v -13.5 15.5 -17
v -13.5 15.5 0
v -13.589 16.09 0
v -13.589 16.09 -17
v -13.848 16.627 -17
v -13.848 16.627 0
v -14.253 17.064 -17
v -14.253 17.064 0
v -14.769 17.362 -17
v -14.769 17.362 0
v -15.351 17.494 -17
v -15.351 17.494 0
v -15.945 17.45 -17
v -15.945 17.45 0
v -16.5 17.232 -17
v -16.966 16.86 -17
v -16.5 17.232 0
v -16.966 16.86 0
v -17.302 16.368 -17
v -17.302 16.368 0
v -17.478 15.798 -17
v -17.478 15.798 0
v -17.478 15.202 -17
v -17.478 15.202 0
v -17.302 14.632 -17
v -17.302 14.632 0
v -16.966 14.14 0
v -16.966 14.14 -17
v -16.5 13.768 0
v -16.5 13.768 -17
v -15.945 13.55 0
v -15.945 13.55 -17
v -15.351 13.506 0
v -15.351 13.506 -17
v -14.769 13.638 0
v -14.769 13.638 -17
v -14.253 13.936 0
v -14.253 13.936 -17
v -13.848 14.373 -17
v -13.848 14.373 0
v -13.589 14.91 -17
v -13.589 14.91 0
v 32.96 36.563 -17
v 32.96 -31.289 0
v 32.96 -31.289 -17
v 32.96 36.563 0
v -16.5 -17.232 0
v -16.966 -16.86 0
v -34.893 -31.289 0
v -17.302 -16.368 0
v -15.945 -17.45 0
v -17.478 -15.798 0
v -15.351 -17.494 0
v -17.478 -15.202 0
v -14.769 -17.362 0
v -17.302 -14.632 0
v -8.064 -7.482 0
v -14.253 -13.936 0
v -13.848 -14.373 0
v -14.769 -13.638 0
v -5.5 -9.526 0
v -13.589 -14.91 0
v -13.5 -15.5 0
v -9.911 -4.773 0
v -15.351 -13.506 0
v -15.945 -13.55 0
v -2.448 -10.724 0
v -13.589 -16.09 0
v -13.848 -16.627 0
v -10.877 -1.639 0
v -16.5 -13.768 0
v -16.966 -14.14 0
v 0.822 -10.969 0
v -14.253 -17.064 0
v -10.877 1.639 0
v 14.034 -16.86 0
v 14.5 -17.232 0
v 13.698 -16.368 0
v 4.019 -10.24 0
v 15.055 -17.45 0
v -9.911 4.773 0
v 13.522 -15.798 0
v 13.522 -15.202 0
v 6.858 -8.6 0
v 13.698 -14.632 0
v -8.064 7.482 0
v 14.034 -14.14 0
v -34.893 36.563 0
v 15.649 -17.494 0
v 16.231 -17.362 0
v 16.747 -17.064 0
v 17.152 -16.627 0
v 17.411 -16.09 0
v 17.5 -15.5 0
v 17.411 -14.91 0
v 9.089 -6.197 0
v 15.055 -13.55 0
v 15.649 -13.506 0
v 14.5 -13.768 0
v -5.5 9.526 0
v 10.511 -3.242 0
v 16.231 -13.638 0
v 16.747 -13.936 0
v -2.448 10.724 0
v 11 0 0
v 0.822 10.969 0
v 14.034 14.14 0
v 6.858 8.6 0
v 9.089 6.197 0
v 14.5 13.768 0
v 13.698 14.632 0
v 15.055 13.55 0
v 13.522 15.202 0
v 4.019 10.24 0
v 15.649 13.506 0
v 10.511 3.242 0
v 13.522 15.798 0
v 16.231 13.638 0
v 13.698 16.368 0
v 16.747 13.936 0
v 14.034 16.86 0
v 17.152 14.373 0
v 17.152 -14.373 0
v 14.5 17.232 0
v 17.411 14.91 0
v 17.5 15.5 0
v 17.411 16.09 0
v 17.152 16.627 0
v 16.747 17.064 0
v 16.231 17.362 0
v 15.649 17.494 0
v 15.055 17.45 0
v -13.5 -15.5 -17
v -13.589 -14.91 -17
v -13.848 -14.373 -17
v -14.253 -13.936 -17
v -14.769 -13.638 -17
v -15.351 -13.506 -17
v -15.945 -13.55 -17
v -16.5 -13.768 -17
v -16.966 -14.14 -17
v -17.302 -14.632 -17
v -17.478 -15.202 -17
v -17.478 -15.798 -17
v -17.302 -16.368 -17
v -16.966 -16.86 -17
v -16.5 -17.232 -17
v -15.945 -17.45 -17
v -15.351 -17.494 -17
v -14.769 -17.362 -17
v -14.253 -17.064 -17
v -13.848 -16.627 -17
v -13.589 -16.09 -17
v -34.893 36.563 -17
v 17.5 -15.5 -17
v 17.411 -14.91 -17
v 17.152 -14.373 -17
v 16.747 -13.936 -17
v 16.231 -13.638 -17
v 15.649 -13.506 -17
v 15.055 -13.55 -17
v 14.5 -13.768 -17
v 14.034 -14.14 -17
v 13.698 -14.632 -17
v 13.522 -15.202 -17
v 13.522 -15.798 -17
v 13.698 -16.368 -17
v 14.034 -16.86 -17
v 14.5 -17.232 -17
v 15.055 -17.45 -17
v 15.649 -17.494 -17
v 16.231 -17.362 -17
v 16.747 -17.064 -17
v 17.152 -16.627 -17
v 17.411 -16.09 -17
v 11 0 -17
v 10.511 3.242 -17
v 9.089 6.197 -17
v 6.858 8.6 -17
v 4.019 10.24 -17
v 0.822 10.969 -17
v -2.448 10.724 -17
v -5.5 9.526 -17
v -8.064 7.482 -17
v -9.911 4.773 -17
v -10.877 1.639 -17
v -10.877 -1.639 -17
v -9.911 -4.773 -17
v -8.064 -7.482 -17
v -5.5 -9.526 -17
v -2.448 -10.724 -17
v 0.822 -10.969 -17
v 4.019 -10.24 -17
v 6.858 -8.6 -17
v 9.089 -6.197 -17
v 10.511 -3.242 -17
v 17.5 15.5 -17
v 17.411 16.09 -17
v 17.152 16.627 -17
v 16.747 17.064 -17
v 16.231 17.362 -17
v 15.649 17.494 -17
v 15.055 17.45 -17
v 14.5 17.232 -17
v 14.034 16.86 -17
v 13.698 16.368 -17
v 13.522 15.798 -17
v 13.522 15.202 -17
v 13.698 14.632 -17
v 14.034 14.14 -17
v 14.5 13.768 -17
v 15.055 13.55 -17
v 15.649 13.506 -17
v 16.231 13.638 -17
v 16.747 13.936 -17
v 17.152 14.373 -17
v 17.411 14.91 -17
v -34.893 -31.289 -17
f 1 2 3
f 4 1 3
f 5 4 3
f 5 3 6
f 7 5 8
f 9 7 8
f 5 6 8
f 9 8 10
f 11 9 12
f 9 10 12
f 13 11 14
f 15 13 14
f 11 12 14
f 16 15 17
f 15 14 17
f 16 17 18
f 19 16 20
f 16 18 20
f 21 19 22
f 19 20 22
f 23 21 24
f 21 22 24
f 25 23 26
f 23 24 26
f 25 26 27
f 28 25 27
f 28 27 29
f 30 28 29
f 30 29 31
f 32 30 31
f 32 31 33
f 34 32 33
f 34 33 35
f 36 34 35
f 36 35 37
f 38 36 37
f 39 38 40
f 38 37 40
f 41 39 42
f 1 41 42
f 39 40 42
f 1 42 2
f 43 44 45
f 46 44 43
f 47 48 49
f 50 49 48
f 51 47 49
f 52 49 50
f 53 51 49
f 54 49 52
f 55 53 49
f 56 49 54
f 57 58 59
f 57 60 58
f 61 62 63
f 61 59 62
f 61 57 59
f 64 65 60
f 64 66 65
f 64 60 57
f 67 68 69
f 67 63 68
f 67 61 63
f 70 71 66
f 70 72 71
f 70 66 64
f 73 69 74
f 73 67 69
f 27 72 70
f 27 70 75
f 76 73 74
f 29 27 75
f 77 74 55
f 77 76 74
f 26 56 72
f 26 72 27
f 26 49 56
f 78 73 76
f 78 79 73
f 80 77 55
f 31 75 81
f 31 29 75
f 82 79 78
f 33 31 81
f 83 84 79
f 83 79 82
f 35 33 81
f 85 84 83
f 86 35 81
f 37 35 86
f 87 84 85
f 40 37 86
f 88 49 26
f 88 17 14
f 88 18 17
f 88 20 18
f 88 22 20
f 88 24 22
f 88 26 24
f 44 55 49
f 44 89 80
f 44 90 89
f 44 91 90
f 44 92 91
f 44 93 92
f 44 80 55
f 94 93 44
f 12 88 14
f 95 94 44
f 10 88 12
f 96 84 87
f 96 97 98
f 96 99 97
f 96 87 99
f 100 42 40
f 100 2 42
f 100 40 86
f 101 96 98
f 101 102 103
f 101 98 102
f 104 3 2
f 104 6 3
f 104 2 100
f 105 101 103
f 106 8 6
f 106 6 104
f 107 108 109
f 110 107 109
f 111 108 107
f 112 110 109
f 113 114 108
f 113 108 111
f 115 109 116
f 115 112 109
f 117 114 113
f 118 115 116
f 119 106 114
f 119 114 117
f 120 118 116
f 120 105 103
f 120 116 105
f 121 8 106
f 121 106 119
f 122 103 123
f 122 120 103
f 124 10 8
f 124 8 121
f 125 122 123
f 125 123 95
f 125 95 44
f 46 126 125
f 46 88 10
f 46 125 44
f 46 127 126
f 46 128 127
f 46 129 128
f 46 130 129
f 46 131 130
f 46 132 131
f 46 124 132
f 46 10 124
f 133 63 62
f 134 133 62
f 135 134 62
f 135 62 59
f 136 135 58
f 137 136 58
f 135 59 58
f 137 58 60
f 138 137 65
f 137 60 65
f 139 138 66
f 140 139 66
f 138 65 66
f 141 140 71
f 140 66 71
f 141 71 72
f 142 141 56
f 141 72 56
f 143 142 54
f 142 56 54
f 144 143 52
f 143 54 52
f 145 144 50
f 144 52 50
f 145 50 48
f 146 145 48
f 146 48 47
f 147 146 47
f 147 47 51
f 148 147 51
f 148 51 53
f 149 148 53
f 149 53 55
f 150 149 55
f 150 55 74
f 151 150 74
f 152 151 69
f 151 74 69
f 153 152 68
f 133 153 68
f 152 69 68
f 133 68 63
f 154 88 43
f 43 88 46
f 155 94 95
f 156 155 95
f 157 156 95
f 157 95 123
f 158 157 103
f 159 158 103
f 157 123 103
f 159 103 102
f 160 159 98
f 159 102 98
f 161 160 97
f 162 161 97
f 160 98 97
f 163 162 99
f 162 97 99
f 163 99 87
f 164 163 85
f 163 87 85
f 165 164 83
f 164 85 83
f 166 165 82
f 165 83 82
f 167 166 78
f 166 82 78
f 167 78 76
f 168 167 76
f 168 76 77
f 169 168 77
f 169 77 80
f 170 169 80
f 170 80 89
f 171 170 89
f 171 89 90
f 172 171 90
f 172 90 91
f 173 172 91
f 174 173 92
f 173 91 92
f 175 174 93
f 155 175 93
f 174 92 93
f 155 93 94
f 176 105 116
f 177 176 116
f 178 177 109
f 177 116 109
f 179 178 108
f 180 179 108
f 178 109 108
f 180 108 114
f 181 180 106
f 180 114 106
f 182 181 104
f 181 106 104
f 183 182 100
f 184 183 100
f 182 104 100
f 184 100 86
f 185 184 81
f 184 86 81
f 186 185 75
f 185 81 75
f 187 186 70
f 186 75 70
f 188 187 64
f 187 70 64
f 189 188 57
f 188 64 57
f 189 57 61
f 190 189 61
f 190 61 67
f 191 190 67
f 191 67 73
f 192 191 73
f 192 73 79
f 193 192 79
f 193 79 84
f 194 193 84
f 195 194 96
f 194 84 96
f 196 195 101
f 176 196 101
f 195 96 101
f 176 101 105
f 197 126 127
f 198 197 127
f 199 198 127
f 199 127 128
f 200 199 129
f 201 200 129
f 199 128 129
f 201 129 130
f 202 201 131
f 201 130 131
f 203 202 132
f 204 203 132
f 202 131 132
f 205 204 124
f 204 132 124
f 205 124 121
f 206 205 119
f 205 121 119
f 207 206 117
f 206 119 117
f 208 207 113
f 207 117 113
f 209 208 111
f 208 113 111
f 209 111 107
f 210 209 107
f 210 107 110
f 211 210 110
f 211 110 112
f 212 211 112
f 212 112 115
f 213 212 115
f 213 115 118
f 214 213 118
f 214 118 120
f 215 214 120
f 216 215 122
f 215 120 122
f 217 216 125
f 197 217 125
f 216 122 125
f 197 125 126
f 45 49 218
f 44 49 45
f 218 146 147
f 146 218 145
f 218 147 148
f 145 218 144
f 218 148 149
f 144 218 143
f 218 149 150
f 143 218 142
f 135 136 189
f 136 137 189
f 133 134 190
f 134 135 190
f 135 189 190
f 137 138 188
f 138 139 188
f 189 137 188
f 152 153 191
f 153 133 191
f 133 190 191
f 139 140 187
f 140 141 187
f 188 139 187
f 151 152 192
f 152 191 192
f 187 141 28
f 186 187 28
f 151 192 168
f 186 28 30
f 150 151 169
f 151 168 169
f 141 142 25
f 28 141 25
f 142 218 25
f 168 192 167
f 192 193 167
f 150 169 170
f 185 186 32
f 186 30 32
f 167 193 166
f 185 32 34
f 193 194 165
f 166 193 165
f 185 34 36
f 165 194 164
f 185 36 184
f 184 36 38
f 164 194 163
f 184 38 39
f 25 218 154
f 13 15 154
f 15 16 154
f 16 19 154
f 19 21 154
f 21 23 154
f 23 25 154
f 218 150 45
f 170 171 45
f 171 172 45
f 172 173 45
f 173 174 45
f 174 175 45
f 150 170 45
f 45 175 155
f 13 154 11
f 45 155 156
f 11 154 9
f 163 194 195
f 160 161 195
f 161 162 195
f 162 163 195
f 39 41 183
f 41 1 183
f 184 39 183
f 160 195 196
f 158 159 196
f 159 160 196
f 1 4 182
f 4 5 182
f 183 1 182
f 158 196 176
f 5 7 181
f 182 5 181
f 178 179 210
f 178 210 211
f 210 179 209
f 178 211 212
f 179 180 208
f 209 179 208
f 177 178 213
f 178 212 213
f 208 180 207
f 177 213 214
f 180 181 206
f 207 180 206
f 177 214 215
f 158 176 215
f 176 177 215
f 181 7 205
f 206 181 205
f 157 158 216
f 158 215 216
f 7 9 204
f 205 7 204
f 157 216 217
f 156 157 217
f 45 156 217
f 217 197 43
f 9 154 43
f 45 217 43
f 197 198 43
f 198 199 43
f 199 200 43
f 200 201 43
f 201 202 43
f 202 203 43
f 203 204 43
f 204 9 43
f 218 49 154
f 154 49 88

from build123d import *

# Parameters (mm, degrees)
SKETCH_1_W          = 67.85270183
SKETCH_1_H          = 67.85270183
EXTRUDE_1_DEPTH     = 17
SKETCH_2_R          = 11
CUT_EXTRUDE_1_DEPTH = 17
SKETCH_3_R          = 2
CUT_EXTRUDE_2_DEPTH = 17


with BuildPart() as part:
    # 草图1 → 凸台-拉伸1 (new body)
    with BuildSketch(Plane.XY):
        with Locations((-0.966617145, 2.637078742)):
            Rectangle(SKETCH_1_W, SKETCH_1_H)
    extrude(amount=-EXTRUDE_1_DEPTH)

    # 草图2 → 切除-拉伸1 (cut)
    with BuildSketch(Plane.XY):
        Circle(SKETCH_2_R)
    extrude(amount=-CUT_EXTRUDE_1_DEPTH, mode=Mode.SUBTRACT)

    # 草图3 → 切除-拉伸2 (cut)
    with BuildSketch(Plane.XY):
        with Locations((-15.5, 15.5)):
            Circle(SKETCH_3_R)
        with Locations((15.5, 15.5)):
            Circle(SKETCH_3_R)
        with Locations((-15.5, -15.5)):
            Circle(SKETCH_3_R)
        with Locations((15.5, -15.5)):
            Circle(SKETCH_3_R)
    extrude(amount=-CUT_EXTRUDE_2_DEPTH, mode=Mode.SUBTRACT)


solid = part.part
